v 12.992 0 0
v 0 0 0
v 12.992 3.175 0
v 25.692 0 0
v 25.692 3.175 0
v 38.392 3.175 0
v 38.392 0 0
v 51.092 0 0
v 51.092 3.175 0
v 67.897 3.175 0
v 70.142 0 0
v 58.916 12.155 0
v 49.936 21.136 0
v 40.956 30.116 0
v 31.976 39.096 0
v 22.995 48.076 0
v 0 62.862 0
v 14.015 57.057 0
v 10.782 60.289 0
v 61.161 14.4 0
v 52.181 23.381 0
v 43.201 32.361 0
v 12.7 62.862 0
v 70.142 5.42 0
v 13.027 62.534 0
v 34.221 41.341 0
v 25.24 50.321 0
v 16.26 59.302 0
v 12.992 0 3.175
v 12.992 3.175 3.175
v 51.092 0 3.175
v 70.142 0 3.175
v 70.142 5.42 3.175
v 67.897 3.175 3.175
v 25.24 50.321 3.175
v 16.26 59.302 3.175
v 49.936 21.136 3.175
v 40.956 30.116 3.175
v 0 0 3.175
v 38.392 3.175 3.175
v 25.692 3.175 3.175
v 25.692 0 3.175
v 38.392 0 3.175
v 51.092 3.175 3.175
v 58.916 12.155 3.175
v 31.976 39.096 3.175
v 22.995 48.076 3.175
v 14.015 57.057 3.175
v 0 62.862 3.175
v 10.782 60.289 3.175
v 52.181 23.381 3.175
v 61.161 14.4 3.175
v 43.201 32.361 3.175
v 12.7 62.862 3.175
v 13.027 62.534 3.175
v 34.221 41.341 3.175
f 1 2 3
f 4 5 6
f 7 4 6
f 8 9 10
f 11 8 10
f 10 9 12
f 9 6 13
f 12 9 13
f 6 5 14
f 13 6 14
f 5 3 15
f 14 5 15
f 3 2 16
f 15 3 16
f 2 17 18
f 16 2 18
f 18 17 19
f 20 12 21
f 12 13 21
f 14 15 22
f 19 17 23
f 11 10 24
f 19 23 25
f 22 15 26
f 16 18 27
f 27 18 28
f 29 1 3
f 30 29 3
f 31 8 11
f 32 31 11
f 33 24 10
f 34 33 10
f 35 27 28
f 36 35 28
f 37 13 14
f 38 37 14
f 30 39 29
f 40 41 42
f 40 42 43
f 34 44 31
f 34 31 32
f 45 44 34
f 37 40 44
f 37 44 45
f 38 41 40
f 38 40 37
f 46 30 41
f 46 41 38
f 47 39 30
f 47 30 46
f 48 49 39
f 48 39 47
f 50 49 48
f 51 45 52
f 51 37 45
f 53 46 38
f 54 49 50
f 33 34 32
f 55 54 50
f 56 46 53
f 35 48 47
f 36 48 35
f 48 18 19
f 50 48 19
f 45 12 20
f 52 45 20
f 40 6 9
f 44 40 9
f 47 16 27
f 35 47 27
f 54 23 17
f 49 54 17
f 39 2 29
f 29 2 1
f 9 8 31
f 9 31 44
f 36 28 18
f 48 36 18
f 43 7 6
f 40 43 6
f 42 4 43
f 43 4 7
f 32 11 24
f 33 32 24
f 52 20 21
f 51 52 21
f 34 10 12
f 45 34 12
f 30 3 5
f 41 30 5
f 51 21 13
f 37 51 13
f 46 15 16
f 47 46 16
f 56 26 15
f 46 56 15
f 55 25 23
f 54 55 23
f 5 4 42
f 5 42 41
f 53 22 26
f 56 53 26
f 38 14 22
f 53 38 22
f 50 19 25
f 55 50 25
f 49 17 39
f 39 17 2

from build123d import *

# Parameters (mm, degrees)
BOSS_EXTRUDE1_DEPTH     = 3.175
CUT_EXTRUDE1_DEPTH      = 95.24196383
CUT_EXTRUDE1_DEPTH_BACK = 95.24196383
SKETCH3_W               = 12.7
SKETCH3_H               = 3.175


with BuildPart() as part:
    # Sketch2 → Boss-Extrude1 (new body)
    with BuildSketch(Plane.XY):
        Polygon((13.027299887, 62.53449296), (12.7, 62.861792847), (0, 62.861792847), (0, 0), (70.141728817, 0), (70.141728817, 5.42006403), (67.896664787, 3.175), (58.916408666, 12.155256121), (61.161472696, 14.400320151), (52.181216575, 23.380576272), (49.936152545, 21.135512242), (40.955896424, 30.115768363), (43.200960454, 32.360832393), (34.220704333, 41.341088515), (31.975640303, 39.096024484), (22.995384182, 48.076280605), (25.240448212, 50.321344636), (16.260192091, 59.301600757), (14.015128061, 57.056536726), (10.782235857, 60.28942893), align=None)
    extrude(amount=BOSS_EXTRUDE1_DEPTH)

    # Sketch3 → Cut-Extrude1 (cut, two sides: drawn at the far end of the back side and taken through both)
    with BuildSketch(Plane.XY.offset(3.175).offset(-CUT_EXTRUDE1_DEPTH_BACK)):
        with Locations((44.741728817, 1.5875)):
            Rectangle(SKETCH3_W, SKETCH3_H)
        with Locations((19.341728817, 1.5875)):
            Rectangle(SKETCH3_W, SKETCH3_H)
    extrude(amount=CUT_EXTRUDE1_DEPTH + CUT_EXTRUDE1_DEPTH_BACK, mode=Mode.SUBTRACT)


solid = part.part
